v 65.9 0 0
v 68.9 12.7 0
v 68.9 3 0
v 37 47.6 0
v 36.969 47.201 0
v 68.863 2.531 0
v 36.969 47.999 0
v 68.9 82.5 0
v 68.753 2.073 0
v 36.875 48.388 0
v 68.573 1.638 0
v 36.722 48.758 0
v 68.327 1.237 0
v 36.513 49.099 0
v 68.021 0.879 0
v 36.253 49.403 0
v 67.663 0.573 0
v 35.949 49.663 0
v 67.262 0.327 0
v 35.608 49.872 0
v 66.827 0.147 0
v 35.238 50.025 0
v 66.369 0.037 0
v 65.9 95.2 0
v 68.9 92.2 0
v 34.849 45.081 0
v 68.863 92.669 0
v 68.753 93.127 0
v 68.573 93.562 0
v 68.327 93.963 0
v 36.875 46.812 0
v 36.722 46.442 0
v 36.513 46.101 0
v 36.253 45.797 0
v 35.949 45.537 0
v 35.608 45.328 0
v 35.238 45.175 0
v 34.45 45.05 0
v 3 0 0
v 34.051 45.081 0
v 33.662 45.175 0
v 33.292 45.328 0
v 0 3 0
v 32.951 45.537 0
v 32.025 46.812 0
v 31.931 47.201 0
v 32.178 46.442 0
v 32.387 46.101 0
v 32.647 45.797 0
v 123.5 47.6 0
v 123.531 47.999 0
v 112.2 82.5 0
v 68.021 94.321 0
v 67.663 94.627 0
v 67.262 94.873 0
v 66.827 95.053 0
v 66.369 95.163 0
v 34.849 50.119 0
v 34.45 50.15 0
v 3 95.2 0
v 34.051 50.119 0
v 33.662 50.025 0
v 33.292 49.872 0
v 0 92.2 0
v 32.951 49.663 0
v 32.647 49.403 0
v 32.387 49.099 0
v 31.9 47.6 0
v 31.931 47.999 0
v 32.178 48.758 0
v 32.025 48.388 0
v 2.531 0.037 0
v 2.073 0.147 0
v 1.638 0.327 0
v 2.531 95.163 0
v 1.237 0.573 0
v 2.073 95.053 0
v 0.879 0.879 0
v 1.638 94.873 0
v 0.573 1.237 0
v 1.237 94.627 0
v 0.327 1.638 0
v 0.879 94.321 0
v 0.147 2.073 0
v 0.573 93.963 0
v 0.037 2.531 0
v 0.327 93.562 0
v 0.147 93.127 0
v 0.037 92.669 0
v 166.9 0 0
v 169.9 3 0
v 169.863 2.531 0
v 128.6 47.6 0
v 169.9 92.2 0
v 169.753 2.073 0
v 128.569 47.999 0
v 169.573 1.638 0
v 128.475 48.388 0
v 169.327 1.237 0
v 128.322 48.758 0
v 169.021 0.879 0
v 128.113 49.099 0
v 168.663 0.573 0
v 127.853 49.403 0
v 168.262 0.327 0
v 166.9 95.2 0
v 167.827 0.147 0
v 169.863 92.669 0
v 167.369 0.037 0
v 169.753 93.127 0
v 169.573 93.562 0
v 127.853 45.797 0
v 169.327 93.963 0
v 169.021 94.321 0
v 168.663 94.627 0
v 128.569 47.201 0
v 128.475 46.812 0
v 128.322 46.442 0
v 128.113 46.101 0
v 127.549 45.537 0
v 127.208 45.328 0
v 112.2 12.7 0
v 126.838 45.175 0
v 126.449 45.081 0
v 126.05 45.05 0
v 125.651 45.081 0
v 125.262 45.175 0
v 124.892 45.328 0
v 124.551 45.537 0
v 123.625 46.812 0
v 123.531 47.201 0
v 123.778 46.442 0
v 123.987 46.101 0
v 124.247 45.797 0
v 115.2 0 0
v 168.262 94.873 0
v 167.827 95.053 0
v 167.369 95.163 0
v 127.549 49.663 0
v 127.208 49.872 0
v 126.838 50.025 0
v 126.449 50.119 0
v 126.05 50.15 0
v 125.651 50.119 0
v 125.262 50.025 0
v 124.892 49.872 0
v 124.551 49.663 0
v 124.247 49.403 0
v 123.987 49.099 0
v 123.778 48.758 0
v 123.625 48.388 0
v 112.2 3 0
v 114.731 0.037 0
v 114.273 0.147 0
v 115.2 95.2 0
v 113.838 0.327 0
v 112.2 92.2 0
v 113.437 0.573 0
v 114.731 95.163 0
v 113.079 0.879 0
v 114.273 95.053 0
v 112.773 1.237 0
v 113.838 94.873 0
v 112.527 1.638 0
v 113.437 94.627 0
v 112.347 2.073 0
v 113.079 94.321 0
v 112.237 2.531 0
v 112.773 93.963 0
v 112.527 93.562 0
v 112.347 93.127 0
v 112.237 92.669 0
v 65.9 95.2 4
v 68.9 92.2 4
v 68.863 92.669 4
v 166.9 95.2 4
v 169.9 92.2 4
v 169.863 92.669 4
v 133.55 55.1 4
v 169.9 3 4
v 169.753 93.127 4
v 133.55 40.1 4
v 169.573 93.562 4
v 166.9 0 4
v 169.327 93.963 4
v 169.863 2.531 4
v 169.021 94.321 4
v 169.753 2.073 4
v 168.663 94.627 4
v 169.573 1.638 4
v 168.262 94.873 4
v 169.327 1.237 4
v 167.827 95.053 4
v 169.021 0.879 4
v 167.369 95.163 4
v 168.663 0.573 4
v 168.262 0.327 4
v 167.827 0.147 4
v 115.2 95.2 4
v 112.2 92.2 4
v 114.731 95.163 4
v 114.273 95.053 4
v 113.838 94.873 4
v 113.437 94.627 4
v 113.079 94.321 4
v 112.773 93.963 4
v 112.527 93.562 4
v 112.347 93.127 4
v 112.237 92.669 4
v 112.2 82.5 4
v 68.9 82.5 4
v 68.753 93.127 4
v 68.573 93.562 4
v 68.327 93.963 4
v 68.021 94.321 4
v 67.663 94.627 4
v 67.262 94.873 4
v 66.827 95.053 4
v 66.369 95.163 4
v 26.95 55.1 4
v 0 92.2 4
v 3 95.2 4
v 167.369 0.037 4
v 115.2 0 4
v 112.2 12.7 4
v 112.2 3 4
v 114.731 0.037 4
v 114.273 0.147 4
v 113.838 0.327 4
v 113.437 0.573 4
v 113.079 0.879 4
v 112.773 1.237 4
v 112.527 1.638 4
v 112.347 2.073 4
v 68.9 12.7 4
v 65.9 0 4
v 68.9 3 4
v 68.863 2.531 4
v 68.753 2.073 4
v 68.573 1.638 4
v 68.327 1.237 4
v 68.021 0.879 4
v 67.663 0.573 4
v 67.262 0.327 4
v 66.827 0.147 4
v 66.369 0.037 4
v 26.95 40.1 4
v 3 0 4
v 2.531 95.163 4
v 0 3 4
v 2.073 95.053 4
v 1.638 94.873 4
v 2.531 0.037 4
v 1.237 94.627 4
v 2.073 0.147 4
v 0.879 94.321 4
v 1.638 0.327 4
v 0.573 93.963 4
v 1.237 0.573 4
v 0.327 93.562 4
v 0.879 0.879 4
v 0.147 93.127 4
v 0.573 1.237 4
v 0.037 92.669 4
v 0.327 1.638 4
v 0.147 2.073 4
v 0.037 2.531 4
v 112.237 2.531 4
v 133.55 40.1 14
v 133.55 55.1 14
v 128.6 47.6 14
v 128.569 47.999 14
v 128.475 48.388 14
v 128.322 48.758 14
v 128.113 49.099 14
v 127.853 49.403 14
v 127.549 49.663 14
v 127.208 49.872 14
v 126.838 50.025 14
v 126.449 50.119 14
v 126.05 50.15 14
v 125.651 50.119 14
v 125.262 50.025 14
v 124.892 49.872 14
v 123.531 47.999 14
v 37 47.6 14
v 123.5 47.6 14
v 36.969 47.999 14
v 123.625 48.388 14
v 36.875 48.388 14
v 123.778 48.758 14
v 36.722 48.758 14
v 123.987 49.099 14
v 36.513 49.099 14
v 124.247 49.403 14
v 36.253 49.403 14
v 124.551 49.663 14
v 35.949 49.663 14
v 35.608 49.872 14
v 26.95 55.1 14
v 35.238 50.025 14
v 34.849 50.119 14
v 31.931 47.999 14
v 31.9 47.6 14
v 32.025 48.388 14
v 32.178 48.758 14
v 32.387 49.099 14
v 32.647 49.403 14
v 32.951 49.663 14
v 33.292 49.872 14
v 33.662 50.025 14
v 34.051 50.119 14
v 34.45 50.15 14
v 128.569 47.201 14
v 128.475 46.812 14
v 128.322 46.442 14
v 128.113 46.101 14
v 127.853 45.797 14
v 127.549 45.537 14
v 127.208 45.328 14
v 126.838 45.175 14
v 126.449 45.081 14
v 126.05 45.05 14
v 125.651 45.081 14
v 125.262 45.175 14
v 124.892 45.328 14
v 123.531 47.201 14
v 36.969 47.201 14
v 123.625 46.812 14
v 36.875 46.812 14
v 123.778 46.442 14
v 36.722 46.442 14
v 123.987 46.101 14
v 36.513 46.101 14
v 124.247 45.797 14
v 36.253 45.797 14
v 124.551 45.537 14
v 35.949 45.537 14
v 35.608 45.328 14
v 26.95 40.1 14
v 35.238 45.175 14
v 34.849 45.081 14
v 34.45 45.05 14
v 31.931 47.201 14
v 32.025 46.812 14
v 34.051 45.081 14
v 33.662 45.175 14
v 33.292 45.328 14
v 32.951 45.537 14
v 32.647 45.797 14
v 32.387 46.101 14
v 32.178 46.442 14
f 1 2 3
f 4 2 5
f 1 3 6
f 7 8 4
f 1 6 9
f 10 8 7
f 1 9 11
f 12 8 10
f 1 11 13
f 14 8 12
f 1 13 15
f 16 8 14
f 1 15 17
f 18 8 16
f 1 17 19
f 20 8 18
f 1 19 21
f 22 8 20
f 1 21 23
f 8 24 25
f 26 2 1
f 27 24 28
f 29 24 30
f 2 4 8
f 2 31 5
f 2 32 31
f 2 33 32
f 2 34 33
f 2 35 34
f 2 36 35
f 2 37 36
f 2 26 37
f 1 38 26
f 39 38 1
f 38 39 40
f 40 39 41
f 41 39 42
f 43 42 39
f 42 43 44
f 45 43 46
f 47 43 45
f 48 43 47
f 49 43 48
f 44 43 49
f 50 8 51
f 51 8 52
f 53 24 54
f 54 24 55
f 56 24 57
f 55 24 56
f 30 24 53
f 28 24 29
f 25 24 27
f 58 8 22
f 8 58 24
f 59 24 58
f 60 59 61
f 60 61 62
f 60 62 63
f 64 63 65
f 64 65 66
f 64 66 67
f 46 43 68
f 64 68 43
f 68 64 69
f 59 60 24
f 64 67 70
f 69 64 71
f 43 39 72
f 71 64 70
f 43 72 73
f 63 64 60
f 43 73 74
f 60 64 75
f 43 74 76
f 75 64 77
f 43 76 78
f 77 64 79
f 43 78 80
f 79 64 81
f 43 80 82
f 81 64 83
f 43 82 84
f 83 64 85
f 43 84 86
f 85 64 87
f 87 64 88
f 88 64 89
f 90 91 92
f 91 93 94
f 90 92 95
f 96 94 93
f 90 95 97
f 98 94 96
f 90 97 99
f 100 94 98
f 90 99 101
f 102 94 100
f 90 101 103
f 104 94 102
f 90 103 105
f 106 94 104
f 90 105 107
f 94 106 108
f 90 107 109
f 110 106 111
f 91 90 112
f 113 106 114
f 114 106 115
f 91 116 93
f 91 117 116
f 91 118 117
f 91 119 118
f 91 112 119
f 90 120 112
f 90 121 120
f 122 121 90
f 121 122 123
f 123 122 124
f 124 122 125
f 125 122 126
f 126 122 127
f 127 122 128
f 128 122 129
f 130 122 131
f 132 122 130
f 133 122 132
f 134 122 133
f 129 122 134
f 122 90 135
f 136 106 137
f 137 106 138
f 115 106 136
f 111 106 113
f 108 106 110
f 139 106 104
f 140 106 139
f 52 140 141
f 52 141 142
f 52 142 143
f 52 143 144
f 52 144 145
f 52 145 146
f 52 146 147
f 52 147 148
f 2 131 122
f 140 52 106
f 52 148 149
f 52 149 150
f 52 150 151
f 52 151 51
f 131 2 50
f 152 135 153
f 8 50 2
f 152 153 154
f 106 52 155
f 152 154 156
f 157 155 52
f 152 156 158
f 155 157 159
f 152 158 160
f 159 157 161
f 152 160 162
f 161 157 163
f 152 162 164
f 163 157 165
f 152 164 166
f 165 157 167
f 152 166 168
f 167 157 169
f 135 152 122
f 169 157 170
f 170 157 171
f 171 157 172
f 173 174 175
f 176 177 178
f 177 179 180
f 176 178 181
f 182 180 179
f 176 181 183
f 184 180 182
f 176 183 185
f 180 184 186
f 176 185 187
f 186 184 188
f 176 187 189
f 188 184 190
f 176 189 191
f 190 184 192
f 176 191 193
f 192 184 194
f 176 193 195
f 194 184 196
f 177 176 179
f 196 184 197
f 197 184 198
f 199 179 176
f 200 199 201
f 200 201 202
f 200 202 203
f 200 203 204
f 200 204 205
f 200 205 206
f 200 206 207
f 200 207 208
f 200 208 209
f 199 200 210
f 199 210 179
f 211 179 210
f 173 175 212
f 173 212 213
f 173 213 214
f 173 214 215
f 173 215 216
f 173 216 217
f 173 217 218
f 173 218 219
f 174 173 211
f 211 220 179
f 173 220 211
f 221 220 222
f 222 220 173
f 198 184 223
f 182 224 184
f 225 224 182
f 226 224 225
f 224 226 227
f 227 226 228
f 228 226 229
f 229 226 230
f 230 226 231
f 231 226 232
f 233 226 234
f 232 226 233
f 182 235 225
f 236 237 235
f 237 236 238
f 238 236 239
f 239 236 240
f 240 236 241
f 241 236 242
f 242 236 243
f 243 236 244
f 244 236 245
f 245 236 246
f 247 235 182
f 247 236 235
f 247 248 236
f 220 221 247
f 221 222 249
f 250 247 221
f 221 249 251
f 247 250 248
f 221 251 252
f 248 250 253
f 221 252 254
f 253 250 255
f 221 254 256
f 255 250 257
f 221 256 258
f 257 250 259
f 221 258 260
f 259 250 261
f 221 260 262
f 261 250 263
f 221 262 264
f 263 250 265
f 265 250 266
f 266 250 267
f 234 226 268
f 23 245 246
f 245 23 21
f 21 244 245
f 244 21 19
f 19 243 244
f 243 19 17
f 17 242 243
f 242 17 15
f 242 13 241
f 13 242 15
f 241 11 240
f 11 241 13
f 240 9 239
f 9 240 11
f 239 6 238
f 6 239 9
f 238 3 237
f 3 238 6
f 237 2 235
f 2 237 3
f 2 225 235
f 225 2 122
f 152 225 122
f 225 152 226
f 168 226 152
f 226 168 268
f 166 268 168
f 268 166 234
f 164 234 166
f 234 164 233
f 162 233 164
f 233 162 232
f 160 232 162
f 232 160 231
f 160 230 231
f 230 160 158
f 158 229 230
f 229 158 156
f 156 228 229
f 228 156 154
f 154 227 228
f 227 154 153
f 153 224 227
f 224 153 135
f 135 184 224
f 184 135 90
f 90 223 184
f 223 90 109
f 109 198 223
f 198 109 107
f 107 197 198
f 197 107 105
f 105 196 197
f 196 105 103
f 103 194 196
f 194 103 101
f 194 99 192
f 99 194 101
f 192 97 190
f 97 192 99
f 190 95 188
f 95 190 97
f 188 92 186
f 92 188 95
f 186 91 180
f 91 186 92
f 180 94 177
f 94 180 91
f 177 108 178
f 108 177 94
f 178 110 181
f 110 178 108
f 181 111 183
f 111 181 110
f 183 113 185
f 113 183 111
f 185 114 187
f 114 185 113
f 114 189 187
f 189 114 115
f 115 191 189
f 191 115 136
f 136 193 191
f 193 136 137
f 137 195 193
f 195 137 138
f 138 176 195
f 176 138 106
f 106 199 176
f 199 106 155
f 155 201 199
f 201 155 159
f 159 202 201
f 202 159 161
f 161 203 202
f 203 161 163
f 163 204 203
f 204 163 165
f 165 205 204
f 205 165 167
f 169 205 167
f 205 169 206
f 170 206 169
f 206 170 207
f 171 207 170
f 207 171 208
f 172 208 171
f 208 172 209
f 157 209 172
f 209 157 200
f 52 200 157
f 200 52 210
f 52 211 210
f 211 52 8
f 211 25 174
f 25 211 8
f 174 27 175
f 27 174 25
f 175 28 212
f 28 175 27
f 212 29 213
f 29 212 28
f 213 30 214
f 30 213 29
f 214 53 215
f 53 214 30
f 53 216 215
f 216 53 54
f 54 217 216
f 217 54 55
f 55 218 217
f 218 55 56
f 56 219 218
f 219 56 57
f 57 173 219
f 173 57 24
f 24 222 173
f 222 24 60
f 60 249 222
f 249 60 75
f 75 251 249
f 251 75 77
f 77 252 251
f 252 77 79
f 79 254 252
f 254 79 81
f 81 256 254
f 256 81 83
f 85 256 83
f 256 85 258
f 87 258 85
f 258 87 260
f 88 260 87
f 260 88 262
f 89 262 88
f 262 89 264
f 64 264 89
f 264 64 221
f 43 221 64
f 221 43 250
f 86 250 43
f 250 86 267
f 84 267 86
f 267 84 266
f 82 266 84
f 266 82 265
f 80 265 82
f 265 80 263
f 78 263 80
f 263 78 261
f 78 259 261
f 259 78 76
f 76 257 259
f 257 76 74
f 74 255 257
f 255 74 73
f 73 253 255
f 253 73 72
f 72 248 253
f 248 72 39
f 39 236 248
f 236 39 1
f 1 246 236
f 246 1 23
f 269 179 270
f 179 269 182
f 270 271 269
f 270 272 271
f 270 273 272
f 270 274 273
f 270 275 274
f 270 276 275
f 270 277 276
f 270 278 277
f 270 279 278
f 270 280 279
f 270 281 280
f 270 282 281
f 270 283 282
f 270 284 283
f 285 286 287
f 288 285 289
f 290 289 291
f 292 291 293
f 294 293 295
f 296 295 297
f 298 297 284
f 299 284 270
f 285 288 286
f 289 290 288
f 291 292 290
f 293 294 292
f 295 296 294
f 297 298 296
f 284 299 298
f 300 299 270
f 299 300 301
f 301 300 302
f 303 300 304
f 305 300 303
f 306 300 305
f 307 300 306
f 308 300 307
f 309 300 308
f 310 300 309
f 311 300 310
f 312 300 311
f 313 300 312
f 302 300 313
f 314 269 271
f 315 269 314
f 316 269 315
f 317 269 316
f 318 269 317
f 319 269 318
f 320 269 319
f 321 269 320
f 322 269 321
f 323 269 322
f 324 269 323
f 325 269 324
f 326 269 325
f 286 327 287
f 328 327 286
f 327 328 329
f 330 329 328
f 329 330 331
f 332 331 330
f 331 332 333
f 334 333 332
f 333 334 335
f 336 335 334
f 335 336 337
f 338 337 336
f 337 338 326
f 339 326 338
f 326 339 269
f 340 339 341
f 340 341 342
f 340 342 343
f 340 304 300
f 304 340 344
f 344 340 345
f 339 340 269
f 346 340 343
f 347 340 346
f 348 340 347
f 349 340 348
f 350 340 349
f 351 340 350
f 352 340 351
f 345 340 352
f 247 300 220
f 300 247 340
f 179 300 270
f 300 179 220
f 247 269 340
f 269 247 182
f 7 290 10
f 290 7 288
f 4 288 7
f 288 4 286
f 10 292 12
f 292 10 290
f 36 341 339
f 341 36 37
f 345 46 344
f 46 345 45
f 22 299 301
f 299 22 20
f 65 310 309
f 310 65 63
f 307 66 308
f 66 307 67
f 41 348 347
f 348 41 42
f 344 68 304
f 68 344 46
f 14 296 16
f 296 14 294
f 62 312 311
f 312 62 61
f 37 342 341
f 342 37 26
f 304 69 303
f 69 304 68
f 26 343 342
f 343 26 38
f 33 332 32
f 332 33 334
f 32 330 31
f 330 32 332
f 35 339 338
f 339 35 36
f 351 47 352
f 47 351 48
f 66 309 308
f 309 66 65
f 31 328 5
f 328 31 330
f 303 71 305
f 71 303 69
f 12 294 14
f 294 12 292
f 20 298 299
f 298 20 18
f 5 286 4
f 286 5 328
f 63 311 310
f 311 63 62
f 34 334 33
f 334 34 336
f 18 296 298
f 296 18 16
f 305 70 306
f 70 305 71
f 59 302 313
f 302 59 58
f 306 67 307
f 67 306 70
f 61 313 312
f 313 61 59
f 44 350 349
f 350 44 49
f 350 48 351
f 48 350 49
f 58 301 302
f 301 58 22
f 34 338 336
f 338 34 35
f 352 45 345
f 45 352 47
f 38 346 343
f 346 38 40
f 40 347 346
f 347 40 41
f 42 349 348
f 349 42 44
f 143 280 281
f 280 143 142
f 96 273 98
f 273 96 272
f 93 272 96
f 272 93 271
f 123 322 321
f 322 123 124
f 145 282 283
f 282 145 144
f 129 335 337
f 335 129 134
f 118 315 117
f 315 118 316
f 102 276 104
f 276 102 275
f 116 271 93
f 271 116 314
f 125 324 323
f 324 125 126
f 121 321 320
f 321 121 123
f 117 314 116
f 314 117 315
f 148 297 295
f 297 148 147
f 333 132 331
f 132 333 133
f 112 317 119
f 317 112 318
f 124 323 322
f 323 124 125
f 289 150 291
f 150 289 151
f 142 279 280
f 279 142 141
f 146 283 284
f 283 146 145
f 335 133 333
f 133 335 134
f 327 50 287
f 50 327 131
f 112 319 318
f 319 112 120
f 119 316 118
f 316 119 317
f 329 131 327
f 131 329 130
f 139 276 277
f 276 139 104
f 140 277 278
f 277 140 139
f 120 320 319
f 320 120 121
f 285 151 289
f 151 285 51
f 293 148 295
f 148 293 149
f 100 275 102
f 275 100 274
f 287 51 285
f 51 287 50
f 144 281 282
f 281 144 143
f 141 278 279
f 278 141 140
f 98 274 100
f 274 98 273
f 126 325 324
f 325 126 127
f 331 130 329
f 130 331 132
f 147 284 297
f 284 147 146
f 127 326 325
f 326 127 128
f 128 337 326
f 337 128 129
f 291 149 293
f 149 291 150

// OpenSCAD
$fn = 40;

// ============================================================
// BASE PLATE DIMENSIONS
// ============================================================
part_outer_width = 95.2;
part_inner_width = 69.8;

part_left_length_raw   = 69.9;
part_center_length_raw = 41.3;
part_right_length_raw  = 58.7;

left_trim  = 1;
right_trim = 1;

part_left_length  = part_left_length_raw  - left_trim;
part_right_length = part_right_length_raw - right_trim;

part_total_length = part_left_length_raw + part_center_length_raw + part_right_length_raw;
part_center_length = part_total_length - part_left_length - part_right_length;

plate_thickness = 4;

// ============================================================
// CORNER ROUNDING
// ============================================================
profile_corner_radius = 3;

// ============================================================
// FOOTPRINTS / SECTION PLACEMENT
// ============================================================
left_section_size   = [part_left_length, part_outer_width];
right_section_size  = [part_right_length, part_outer_width];
center_section_size = [part_center_length, part_inner_width];

center_section_x = left_section_size[0];
center_section_y_offset = (part_outer_width - part_inner_width) / 2;
right_section_x = left_section_size[0] + center_section_size[0];

// ============================================================
// 2D HELPERS
// ============================================================
module rect_2d(sz) {
    square(sz, center = false);
}

module rounded_shape_2d(r) {
    offset(r = r)
        offset(delta = -r)
            children();
}

// ============================================================
// 2D BASE PROFILE
// ============================================================
module base_profile_2d() {
    union() {
        rect_2d(left_section_size);

        translate([center_section_x, center_section_y_offset])
            rect_2d(center_section_size);

        translate([right_section_x, 0])
            rect_2d(right_section_size);
    }
}

module rounded_base_profile_2d(r = profile_corner_radius) {
    rounded_shape_2d(r)
        base_profile_2d();
}

// ============================================================
// 3D BASE PLATE
// ============================================================
module base_3d(thickness = plate_thickness, corner_radius = profile_corner_radius) {
    linear_extrude(height = thickness)
        rounded_base_profile_2d(corner_radius);
}

// ============================================================
// EXAMPLE USAGE
// ============================================================
// base_3d();              // default 4 mm thick
// base_3d(10);            // 10 mm thick
// base_3d(6, 2);          // 6 mm thick with 2 mm corner radius



// ============================================================
// SCREW HOLE PARAMETERS
// ============================================================
screw_hole_02_x_adjust = 15;
rivet_nut_hole_dia = 5.10;

screw_x_positions = [
    part_left_length / 2,
    part_left_length + part_center_length + (part_right_length / 2) - screw_hole_02_x_adjust
];

screw_y = part_outer_width / 2;

module tall_cylinder(diameter = rivet_nut_hole_dia, height = 75) {
    translate([0, 0, -.1])
    cylinder(d = diameter, h = height, center = false);
};

// ============================================================
// DRILL TEMPLATE RIB
// ============================================================

// 15 mm wide --> 7.5 mm half-width
// 10 mm tall

rib_width = 15;
rib_height = 10 + plate_thickness;

rib_size_x = screw_x_positions[1] - screw_x_positions[0] + rib_width;

rib_dims = [rib_size_x, rib_width, rib_height];

rib_translate = [screw_x_positions[0] - (rib_width / 2), (part_outer_width / 2) - (rib_width / 2), 0];

module drill_plate_rib(t_vector, sz) {
    translate(t_vector)
    cube(sz, center = false);
};

drop_z = .1;

difference() {
    union() {
        base_3d();
        drill_plate_rib(rib_translate, rib_dims);
    };

    for (x = screw_x_positions)
        translate([x, screw_y, 0])
            tall_cylinder();
};
